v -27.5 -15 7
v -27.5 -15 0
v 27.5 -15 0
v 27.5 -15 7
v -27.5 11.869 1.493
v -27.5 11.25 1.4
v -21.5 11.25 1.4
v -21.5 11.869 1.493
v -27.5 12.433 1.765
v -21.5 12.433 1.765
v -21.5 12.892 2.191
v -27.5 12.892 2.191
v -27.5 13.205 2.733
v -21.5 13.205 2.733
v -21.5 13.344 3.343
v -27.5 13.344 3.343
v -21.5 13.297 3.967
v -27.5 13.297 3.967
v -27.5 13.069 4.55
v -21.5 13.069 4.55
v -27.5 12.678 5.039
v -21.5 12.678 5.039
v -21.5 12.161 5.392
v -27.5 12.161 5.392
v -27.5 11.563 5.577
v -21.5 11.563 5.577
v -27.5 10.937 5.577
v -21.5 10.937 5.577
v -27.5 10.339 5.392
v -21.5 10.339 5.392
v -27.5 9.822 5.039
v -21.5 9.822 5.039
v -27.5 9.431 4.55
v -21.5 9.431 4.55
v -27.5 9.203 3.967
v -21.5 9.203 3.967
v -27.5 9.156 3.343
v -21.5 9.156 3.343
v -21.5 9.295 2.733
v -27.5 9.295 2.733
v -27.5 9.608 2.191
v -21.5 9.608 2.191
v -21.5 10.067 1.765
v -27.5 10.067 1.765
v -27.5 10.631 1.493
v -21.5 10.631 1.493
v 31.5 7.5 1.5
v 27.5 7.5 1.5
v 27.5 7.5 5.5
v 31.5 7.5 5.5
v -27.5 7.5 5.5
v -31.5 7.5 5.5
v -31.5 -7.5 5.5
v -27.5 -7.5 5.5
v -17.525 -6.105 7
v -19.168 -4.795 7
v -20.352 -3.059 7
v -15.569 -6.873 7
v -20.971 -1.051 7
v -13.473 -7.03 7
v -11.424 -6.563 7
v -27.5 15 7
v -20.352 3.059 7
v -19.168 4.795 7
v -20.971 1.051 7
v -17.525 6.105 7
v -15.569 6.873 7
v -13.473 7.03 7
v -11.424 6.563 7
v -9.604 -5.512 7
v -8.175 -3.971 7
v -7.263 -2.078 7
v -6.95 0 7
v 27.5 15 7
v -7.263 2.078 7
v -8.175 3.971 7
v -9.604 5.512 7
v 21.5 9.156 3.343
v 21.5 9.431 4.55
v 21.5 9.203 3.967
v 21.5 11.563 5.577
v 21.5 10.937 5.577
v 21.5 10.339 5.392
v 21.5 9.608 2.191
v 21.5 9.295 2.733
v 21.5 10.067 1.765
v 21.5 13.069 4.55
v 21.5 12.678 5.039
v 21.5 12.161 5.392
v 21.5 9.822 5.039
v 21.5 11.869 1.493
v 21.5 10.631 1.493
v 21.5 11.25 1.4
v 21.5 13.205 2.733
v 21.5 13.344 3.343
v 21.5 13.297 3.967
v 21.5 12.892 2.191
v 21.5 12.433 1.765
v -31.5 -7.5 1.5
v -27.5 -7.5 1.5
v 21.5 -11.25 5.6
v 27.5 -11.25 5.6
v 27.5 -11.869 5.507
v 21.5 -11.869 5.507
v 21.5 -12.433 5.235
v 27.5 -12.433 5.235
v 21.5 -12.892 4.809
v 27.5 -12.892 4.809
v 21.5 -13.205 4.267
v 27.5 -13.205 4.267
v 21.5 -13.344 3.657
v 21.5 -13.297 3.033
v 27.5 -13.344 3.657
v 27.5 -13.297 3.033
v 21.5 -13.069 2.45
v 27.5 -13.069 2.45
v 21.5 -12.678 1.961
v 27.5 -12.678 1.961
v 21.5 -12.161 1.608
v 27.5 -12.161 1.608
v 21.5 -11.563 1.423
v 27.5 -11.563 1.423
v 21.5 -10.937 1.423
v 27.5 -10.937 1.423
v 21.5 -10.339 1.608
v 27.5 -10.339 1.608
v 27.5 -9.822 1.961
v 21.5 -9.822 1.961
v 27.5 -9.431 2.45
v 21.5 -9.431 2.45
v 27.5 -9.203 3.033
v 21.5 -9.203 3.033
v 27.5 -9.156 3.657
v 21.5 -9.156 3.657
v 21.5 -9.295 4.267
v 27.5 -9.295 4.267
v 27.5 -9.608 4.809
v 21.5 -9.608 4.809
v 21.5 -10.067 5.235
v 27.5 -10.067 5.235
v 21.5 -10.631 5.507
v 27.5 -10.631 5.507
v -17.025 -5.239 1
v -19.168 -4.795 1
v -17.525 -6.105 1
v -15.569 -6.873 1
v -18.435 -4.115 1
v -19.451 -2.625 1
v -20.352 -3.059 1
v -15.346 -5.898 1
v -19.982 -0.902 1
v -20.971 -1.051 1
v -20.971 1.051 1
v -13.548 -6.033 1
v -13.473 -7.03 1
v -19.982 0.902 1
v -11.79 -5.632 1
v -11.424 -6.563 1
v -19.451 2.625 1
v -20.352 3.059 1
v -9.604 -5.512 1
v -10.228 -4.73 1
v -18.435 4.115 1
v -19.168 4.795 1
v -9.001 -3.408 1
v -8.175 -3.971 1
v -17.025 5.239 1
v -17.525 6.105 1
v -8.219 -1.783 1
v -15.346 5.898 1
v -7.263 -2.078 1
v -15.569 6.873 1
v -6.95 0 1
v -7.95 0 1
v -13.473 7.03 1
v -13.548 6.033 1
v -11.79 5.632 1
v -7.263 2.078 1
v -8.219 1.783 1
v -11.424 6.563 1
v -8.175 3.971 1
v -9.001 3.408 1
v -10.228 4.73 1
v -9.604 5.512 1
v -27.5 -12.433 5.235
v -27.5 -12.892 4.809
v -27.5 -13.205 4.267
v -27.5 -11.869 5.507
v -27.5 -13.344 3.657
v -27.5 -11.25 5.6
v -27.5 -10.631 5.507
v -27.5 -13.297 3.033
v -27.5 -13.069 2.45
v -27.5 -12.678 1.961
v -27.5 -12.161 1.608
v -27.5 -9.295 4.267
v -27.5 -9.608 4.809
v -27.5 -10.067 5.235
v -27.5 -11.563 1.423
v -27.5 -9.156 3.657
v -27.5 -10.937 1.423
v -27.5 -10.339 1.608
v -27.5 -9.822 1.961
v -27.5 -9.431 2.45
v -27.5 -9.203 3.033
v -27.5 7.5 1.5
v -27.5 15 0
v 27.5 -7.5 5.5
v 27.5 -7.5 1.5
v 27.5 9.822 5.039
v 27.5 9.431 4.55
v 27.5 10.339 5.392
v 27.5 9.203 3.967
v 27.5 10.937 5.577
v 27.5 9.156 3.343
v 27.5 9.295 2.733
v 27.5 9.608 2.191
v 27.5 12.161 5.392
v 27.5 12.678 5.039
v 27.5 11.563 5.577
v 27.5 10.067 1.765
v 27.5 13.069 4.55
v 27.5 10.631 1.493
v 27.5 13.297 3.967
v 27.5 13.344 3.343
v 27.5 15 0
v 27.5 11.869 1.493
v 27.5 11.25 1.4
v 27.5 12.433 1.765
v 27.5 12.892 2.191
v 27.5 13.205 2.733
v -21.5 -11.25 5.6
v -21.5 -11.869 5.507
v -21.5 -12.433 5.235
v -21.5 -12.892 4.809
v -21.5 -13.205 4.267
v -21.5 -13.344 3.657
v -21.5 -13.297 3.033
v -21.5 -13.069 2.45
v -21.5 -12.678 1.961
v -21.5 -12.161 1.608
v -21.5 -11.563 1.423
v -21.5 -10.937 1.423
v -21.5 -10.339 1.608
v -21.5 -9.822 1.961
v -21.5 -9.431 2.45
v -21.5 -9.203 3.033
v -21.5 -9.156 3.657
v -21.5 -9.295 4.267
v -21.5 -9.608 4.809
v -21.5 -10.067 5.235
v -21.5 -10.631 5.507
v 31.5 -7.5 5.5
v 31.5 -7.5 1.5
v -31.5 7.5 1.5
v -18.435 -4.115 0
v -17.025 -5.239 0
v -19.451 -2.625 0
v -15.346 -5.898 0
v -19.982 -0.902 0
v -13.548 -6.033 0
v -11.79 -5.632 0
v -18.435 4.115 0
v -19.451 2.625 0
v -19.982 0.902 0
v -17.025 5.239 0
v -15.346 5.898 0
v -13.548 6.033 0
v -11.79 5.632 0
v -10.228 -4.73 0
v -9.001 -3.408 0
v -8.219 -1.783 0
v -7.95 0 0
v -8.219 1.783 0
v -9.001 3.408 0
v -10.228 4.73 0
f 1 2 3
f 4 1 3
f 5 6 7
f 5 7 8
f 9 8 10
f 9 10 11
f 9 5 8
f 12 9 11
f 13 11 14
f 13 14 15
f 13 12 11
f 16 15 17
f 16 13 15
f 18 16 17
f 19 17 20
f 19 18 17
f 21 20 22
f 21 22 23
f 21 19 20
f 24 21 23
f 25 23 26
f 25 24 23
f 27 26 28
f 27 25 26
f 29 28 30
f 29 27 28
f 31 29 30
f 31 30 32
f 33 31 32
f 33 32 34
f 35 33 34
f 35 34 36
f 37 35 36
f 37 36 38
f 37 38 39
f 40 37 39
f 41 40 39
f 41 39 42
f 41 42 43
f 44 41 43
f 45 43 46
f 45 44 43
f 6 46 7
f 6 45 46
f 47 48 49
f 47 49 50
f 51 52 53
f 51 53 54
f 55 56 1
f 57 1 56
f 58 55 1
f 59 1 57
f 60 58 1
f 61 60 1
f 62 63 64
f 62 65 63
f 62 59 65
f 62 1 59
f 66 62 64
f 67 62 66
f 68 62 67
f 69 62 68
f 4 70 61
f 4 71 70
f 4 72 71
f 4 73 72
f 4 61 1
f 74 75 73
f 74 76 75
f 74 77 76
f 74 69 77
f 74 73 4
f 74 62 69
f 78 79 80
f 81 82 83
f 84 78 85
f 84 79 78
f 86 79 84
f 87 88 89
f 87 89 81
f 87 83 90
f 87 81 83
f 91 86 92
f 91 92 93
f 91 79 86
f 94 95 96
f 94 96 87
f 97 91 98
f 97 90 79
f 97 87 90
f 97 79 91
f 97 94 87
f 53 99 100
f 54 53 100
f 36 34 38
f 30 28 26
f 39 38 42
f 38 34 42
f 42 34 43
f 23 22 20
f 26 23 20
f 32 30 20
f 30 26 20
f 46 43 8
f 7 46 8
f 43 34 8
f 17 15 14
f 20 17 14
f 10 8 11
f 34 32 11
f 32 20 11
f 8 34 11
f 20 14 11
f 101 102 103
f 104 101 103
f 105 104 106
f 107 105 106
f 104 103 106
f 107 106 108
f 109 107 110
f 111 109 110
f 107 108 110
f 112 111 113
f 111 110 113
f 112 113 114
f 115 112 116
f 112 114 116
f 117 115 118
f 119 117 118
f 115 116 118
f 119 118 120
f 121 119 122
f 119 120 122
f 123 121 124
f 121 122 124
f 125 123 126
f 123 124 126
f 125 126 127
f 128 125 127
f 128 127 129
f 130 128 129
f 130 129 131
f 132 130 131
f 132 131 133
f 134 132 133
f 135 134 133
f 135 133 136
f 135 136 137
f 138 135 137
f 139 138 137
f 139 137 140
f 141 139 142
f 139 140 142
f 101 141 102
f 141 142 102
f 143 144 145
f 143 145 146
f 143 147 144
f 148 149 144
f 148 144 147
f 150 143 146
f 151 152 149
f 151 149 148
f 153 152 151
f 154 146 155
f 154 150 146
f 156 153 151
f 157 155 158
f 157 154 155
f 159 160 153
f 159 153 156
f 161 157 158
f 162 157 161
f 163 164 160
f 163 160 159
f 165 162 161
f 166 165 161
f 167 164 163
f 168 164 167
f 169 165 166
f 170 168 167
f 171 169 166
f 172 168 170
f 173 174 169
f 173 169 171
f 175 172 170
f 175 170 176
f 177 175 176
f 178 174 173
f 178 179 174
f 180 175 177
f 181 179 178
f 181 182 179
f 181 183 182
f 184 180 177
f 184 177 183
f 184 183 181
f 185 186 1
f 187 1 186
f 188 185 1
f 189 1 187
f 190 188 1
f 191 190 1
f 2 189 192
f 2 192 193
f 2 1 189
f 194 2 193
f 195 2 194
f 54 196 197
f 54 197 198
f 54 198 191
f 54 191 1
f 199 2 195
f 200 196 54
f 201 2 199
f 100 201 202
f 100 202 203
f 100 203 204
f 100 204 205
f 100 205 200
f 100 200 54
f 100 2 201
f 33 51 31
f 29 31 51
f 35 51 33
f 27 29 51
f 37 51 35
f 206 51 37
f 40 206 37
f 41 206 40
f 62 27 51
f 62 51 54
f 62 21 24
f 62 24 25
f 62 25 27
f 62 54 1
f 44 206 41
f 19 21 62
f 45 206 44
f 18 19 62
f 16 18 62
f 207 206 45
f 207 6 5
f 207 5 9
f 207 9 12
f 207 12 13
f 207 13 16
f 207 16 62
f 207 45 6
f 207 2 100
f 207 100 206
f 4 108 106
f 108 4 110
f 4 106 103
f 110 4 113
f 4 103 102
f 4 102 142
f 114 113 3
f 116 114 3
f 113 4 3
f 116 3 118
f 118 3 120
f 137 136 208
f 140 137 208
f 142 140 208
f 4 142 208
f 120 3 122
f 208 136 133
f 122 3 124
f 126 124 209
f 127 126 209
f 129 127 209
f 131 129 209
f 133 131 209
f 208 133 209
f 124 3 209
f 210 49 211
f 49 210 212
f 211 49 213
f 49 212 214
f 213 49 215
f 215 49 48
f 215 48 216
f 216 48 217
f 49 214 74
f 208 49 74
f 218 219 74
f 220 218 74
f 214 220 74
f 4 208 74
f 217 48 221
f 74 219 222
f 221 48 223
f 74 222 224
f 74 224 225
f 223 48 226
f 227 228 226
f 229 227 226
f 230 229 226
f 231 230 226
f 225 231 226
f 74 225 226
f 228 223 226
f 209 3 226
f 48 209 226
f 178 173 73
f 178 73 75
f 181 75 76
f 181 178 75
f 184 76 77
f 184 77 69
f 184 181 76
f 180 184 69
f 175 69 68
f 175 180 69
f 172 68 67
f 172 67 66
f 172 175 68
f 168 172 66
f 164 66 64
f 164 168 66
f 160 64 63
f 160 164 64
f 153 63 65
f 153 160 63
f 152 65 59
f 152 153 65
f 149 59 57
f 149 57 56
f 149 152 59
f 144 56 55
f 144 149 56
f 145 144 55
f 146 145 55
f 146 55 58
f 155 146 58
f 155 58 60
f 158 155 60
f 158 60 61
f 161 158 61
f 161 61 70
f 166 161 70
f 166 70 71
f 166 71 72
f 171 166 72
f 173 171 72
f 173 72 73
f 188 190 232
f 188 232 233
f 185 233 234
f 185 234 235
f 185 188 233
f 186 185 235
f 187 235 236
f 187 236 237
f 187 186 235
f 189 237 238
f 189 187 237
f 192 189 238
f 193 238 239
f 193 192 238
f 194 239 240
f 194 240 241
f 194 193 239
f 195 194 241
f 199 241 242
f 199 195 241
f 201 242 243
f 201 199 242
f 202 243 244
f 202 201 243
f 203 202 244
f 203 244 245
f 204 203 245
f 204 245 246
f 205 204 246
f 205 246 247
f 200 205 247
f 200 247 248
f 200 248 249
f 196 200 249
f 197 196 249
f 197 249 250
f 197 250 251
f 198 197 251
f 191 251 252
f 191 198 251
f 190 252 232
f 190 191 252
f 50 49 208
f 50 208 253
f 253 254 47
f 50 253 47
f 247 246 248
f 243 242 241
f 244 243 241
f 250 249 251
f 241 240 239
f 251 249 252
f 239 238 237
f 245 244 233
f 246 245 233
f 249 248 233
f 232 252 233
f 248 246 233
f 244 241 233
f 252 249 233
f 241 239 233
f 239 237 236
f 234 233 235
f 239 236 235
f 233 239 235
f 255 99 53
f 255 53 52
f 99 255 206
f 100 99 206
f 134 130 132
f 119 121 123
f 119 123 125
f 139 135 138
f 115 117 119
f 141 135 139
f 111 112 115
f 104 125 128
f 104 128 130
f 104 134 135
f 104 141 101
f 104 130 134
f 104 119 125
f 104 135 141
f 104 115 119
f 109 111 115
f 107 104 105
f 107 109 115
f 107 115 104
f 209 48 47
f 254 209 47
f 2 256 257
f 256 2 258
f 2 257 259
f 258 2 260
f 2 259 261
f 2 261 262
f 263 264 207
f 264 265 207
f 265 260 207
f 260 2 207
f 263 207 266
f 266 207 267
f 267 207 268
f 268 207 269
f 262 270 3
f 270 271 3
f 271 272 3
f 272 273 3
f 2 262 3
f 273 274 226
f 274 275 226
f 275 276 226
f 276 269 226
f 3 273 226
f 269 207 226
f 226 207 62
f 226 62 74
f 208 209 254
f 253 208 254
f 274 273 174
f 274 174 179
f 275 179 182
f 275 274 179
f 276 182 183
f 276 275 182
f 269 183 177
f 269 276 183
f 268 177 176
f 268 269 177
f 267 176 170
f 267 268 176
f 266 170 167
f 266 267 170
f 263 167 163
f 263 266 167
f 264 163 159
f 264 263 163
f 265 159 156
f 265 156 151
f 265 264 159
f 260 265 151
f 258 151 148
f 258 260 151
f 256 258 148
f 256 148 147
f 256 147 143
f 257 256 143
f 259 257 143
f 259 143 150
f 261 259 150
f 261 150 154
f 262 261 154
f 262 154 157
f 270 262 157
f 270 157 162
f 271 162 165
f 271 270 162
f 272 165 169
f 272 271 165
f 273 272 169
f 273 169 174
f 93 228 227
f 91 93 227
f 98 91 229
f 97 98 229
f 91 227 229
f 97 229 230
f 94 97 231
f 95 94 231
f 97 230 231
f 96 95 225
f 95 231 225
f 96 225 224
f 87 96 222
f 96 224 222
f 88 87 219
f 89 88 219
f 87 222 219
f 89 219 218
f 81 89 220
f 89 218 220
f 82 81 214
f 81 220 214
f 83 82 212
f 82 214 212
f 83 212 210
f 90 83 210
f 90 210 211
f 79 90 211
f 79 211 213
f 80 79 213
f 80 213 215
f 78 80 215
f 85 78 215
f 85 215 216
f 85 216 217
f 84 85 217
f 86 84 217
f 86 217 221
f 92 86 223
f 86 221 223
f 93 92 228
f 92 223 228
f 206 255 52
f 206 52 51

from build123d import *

# Parameters (mm, degrees)
SKETCH_1_W          = 55
SKETCH_1_H          = 30
SKETCH_1_R          = 7.05
EXTRUDE_1_DEPTH     = 7
SKETCH_2_R          = 7.05
SKETCH_2_R_2        = 6.05
EXTRUDE_2_DEPTH     = 1
EXTRUDE_START       = 1.5
SKETCH_3_W          = 4
SKETCH_3_H          = 15
EXTRUDE_3_DEPTH     = 4
SKETCH_4_R          = 2.1
CUT_EXTRUDE_1_DEPTH = 6


with BuildPart() as part:
    # Эскиз1 → Бобышка-Вытянуть1 (new body)
    with BuildSketch(Plane.XY):
        Rectangle(SKETCH_1_W, SKETCH_1_H)
        with Locations((-14, 0)):
            Circle(SKETCH_1_R, mode=Mode.SUBTRACT)
    extrude(amount=EXTRUDE_1_DEPTH)

    # Эскиз2 → Бобышка-Вытянуть2 (add)
    with BuildSketch(Plane.XY):
        with Locations((-14, 0)):
            Circle(SKETCH_2_R)
        with Locations((-14, 0)):
            Circle(SKETCH_2_R_2, mode=Mode.SUBTRACT)
    extrude(amount=EXTRUDE_2_DEPTH)

    # Эскиз3 → Бобышка-Вытянуть3 (add)
    with BuildSketch(Plane.XY.offset(EXTRUDE_START)):
        with Locations((29.5, 0)):
            Rectangle(SKETCH_3_W, SKETCH_3_H)
        with Locations((-29.5, 0)):
            Rectangle(SKETCH_3_W, SKETCH_3_H)
    extrude(amount=EXTRUDE_3_DEPTH)

    # Эскиз4 → Вырез-Вытянуть1 (cut)
    with BuildSketch(Plane(origin=(27.5, 0, 0), x_dir=(0, 0, -1), z_dir=(1, 0, 0))):
        with Locations((-3.5, 11.25)):
            Circle(SKETCH_4_R)
        with Locations(Location((-3.5, -11.25, 0), (0, 0, 180))):
            Circle(SKETCH_4_R)
    cut_extrude_1 = extrude(amount=-CUT_EXTRUDE_1_DEPTH, mode=Mode.SUBTRACT)

    # Зеркальное отражение1: Вырез-Вытянуть1 across plane
    add(cut_extrude_1.mirror(Plane(origin=(0, 0, 0), x_dir=(0, 0, 1), z_dir=(1, 0, 0))), mode=Mode.SUBTRACT)


solid = part.part
